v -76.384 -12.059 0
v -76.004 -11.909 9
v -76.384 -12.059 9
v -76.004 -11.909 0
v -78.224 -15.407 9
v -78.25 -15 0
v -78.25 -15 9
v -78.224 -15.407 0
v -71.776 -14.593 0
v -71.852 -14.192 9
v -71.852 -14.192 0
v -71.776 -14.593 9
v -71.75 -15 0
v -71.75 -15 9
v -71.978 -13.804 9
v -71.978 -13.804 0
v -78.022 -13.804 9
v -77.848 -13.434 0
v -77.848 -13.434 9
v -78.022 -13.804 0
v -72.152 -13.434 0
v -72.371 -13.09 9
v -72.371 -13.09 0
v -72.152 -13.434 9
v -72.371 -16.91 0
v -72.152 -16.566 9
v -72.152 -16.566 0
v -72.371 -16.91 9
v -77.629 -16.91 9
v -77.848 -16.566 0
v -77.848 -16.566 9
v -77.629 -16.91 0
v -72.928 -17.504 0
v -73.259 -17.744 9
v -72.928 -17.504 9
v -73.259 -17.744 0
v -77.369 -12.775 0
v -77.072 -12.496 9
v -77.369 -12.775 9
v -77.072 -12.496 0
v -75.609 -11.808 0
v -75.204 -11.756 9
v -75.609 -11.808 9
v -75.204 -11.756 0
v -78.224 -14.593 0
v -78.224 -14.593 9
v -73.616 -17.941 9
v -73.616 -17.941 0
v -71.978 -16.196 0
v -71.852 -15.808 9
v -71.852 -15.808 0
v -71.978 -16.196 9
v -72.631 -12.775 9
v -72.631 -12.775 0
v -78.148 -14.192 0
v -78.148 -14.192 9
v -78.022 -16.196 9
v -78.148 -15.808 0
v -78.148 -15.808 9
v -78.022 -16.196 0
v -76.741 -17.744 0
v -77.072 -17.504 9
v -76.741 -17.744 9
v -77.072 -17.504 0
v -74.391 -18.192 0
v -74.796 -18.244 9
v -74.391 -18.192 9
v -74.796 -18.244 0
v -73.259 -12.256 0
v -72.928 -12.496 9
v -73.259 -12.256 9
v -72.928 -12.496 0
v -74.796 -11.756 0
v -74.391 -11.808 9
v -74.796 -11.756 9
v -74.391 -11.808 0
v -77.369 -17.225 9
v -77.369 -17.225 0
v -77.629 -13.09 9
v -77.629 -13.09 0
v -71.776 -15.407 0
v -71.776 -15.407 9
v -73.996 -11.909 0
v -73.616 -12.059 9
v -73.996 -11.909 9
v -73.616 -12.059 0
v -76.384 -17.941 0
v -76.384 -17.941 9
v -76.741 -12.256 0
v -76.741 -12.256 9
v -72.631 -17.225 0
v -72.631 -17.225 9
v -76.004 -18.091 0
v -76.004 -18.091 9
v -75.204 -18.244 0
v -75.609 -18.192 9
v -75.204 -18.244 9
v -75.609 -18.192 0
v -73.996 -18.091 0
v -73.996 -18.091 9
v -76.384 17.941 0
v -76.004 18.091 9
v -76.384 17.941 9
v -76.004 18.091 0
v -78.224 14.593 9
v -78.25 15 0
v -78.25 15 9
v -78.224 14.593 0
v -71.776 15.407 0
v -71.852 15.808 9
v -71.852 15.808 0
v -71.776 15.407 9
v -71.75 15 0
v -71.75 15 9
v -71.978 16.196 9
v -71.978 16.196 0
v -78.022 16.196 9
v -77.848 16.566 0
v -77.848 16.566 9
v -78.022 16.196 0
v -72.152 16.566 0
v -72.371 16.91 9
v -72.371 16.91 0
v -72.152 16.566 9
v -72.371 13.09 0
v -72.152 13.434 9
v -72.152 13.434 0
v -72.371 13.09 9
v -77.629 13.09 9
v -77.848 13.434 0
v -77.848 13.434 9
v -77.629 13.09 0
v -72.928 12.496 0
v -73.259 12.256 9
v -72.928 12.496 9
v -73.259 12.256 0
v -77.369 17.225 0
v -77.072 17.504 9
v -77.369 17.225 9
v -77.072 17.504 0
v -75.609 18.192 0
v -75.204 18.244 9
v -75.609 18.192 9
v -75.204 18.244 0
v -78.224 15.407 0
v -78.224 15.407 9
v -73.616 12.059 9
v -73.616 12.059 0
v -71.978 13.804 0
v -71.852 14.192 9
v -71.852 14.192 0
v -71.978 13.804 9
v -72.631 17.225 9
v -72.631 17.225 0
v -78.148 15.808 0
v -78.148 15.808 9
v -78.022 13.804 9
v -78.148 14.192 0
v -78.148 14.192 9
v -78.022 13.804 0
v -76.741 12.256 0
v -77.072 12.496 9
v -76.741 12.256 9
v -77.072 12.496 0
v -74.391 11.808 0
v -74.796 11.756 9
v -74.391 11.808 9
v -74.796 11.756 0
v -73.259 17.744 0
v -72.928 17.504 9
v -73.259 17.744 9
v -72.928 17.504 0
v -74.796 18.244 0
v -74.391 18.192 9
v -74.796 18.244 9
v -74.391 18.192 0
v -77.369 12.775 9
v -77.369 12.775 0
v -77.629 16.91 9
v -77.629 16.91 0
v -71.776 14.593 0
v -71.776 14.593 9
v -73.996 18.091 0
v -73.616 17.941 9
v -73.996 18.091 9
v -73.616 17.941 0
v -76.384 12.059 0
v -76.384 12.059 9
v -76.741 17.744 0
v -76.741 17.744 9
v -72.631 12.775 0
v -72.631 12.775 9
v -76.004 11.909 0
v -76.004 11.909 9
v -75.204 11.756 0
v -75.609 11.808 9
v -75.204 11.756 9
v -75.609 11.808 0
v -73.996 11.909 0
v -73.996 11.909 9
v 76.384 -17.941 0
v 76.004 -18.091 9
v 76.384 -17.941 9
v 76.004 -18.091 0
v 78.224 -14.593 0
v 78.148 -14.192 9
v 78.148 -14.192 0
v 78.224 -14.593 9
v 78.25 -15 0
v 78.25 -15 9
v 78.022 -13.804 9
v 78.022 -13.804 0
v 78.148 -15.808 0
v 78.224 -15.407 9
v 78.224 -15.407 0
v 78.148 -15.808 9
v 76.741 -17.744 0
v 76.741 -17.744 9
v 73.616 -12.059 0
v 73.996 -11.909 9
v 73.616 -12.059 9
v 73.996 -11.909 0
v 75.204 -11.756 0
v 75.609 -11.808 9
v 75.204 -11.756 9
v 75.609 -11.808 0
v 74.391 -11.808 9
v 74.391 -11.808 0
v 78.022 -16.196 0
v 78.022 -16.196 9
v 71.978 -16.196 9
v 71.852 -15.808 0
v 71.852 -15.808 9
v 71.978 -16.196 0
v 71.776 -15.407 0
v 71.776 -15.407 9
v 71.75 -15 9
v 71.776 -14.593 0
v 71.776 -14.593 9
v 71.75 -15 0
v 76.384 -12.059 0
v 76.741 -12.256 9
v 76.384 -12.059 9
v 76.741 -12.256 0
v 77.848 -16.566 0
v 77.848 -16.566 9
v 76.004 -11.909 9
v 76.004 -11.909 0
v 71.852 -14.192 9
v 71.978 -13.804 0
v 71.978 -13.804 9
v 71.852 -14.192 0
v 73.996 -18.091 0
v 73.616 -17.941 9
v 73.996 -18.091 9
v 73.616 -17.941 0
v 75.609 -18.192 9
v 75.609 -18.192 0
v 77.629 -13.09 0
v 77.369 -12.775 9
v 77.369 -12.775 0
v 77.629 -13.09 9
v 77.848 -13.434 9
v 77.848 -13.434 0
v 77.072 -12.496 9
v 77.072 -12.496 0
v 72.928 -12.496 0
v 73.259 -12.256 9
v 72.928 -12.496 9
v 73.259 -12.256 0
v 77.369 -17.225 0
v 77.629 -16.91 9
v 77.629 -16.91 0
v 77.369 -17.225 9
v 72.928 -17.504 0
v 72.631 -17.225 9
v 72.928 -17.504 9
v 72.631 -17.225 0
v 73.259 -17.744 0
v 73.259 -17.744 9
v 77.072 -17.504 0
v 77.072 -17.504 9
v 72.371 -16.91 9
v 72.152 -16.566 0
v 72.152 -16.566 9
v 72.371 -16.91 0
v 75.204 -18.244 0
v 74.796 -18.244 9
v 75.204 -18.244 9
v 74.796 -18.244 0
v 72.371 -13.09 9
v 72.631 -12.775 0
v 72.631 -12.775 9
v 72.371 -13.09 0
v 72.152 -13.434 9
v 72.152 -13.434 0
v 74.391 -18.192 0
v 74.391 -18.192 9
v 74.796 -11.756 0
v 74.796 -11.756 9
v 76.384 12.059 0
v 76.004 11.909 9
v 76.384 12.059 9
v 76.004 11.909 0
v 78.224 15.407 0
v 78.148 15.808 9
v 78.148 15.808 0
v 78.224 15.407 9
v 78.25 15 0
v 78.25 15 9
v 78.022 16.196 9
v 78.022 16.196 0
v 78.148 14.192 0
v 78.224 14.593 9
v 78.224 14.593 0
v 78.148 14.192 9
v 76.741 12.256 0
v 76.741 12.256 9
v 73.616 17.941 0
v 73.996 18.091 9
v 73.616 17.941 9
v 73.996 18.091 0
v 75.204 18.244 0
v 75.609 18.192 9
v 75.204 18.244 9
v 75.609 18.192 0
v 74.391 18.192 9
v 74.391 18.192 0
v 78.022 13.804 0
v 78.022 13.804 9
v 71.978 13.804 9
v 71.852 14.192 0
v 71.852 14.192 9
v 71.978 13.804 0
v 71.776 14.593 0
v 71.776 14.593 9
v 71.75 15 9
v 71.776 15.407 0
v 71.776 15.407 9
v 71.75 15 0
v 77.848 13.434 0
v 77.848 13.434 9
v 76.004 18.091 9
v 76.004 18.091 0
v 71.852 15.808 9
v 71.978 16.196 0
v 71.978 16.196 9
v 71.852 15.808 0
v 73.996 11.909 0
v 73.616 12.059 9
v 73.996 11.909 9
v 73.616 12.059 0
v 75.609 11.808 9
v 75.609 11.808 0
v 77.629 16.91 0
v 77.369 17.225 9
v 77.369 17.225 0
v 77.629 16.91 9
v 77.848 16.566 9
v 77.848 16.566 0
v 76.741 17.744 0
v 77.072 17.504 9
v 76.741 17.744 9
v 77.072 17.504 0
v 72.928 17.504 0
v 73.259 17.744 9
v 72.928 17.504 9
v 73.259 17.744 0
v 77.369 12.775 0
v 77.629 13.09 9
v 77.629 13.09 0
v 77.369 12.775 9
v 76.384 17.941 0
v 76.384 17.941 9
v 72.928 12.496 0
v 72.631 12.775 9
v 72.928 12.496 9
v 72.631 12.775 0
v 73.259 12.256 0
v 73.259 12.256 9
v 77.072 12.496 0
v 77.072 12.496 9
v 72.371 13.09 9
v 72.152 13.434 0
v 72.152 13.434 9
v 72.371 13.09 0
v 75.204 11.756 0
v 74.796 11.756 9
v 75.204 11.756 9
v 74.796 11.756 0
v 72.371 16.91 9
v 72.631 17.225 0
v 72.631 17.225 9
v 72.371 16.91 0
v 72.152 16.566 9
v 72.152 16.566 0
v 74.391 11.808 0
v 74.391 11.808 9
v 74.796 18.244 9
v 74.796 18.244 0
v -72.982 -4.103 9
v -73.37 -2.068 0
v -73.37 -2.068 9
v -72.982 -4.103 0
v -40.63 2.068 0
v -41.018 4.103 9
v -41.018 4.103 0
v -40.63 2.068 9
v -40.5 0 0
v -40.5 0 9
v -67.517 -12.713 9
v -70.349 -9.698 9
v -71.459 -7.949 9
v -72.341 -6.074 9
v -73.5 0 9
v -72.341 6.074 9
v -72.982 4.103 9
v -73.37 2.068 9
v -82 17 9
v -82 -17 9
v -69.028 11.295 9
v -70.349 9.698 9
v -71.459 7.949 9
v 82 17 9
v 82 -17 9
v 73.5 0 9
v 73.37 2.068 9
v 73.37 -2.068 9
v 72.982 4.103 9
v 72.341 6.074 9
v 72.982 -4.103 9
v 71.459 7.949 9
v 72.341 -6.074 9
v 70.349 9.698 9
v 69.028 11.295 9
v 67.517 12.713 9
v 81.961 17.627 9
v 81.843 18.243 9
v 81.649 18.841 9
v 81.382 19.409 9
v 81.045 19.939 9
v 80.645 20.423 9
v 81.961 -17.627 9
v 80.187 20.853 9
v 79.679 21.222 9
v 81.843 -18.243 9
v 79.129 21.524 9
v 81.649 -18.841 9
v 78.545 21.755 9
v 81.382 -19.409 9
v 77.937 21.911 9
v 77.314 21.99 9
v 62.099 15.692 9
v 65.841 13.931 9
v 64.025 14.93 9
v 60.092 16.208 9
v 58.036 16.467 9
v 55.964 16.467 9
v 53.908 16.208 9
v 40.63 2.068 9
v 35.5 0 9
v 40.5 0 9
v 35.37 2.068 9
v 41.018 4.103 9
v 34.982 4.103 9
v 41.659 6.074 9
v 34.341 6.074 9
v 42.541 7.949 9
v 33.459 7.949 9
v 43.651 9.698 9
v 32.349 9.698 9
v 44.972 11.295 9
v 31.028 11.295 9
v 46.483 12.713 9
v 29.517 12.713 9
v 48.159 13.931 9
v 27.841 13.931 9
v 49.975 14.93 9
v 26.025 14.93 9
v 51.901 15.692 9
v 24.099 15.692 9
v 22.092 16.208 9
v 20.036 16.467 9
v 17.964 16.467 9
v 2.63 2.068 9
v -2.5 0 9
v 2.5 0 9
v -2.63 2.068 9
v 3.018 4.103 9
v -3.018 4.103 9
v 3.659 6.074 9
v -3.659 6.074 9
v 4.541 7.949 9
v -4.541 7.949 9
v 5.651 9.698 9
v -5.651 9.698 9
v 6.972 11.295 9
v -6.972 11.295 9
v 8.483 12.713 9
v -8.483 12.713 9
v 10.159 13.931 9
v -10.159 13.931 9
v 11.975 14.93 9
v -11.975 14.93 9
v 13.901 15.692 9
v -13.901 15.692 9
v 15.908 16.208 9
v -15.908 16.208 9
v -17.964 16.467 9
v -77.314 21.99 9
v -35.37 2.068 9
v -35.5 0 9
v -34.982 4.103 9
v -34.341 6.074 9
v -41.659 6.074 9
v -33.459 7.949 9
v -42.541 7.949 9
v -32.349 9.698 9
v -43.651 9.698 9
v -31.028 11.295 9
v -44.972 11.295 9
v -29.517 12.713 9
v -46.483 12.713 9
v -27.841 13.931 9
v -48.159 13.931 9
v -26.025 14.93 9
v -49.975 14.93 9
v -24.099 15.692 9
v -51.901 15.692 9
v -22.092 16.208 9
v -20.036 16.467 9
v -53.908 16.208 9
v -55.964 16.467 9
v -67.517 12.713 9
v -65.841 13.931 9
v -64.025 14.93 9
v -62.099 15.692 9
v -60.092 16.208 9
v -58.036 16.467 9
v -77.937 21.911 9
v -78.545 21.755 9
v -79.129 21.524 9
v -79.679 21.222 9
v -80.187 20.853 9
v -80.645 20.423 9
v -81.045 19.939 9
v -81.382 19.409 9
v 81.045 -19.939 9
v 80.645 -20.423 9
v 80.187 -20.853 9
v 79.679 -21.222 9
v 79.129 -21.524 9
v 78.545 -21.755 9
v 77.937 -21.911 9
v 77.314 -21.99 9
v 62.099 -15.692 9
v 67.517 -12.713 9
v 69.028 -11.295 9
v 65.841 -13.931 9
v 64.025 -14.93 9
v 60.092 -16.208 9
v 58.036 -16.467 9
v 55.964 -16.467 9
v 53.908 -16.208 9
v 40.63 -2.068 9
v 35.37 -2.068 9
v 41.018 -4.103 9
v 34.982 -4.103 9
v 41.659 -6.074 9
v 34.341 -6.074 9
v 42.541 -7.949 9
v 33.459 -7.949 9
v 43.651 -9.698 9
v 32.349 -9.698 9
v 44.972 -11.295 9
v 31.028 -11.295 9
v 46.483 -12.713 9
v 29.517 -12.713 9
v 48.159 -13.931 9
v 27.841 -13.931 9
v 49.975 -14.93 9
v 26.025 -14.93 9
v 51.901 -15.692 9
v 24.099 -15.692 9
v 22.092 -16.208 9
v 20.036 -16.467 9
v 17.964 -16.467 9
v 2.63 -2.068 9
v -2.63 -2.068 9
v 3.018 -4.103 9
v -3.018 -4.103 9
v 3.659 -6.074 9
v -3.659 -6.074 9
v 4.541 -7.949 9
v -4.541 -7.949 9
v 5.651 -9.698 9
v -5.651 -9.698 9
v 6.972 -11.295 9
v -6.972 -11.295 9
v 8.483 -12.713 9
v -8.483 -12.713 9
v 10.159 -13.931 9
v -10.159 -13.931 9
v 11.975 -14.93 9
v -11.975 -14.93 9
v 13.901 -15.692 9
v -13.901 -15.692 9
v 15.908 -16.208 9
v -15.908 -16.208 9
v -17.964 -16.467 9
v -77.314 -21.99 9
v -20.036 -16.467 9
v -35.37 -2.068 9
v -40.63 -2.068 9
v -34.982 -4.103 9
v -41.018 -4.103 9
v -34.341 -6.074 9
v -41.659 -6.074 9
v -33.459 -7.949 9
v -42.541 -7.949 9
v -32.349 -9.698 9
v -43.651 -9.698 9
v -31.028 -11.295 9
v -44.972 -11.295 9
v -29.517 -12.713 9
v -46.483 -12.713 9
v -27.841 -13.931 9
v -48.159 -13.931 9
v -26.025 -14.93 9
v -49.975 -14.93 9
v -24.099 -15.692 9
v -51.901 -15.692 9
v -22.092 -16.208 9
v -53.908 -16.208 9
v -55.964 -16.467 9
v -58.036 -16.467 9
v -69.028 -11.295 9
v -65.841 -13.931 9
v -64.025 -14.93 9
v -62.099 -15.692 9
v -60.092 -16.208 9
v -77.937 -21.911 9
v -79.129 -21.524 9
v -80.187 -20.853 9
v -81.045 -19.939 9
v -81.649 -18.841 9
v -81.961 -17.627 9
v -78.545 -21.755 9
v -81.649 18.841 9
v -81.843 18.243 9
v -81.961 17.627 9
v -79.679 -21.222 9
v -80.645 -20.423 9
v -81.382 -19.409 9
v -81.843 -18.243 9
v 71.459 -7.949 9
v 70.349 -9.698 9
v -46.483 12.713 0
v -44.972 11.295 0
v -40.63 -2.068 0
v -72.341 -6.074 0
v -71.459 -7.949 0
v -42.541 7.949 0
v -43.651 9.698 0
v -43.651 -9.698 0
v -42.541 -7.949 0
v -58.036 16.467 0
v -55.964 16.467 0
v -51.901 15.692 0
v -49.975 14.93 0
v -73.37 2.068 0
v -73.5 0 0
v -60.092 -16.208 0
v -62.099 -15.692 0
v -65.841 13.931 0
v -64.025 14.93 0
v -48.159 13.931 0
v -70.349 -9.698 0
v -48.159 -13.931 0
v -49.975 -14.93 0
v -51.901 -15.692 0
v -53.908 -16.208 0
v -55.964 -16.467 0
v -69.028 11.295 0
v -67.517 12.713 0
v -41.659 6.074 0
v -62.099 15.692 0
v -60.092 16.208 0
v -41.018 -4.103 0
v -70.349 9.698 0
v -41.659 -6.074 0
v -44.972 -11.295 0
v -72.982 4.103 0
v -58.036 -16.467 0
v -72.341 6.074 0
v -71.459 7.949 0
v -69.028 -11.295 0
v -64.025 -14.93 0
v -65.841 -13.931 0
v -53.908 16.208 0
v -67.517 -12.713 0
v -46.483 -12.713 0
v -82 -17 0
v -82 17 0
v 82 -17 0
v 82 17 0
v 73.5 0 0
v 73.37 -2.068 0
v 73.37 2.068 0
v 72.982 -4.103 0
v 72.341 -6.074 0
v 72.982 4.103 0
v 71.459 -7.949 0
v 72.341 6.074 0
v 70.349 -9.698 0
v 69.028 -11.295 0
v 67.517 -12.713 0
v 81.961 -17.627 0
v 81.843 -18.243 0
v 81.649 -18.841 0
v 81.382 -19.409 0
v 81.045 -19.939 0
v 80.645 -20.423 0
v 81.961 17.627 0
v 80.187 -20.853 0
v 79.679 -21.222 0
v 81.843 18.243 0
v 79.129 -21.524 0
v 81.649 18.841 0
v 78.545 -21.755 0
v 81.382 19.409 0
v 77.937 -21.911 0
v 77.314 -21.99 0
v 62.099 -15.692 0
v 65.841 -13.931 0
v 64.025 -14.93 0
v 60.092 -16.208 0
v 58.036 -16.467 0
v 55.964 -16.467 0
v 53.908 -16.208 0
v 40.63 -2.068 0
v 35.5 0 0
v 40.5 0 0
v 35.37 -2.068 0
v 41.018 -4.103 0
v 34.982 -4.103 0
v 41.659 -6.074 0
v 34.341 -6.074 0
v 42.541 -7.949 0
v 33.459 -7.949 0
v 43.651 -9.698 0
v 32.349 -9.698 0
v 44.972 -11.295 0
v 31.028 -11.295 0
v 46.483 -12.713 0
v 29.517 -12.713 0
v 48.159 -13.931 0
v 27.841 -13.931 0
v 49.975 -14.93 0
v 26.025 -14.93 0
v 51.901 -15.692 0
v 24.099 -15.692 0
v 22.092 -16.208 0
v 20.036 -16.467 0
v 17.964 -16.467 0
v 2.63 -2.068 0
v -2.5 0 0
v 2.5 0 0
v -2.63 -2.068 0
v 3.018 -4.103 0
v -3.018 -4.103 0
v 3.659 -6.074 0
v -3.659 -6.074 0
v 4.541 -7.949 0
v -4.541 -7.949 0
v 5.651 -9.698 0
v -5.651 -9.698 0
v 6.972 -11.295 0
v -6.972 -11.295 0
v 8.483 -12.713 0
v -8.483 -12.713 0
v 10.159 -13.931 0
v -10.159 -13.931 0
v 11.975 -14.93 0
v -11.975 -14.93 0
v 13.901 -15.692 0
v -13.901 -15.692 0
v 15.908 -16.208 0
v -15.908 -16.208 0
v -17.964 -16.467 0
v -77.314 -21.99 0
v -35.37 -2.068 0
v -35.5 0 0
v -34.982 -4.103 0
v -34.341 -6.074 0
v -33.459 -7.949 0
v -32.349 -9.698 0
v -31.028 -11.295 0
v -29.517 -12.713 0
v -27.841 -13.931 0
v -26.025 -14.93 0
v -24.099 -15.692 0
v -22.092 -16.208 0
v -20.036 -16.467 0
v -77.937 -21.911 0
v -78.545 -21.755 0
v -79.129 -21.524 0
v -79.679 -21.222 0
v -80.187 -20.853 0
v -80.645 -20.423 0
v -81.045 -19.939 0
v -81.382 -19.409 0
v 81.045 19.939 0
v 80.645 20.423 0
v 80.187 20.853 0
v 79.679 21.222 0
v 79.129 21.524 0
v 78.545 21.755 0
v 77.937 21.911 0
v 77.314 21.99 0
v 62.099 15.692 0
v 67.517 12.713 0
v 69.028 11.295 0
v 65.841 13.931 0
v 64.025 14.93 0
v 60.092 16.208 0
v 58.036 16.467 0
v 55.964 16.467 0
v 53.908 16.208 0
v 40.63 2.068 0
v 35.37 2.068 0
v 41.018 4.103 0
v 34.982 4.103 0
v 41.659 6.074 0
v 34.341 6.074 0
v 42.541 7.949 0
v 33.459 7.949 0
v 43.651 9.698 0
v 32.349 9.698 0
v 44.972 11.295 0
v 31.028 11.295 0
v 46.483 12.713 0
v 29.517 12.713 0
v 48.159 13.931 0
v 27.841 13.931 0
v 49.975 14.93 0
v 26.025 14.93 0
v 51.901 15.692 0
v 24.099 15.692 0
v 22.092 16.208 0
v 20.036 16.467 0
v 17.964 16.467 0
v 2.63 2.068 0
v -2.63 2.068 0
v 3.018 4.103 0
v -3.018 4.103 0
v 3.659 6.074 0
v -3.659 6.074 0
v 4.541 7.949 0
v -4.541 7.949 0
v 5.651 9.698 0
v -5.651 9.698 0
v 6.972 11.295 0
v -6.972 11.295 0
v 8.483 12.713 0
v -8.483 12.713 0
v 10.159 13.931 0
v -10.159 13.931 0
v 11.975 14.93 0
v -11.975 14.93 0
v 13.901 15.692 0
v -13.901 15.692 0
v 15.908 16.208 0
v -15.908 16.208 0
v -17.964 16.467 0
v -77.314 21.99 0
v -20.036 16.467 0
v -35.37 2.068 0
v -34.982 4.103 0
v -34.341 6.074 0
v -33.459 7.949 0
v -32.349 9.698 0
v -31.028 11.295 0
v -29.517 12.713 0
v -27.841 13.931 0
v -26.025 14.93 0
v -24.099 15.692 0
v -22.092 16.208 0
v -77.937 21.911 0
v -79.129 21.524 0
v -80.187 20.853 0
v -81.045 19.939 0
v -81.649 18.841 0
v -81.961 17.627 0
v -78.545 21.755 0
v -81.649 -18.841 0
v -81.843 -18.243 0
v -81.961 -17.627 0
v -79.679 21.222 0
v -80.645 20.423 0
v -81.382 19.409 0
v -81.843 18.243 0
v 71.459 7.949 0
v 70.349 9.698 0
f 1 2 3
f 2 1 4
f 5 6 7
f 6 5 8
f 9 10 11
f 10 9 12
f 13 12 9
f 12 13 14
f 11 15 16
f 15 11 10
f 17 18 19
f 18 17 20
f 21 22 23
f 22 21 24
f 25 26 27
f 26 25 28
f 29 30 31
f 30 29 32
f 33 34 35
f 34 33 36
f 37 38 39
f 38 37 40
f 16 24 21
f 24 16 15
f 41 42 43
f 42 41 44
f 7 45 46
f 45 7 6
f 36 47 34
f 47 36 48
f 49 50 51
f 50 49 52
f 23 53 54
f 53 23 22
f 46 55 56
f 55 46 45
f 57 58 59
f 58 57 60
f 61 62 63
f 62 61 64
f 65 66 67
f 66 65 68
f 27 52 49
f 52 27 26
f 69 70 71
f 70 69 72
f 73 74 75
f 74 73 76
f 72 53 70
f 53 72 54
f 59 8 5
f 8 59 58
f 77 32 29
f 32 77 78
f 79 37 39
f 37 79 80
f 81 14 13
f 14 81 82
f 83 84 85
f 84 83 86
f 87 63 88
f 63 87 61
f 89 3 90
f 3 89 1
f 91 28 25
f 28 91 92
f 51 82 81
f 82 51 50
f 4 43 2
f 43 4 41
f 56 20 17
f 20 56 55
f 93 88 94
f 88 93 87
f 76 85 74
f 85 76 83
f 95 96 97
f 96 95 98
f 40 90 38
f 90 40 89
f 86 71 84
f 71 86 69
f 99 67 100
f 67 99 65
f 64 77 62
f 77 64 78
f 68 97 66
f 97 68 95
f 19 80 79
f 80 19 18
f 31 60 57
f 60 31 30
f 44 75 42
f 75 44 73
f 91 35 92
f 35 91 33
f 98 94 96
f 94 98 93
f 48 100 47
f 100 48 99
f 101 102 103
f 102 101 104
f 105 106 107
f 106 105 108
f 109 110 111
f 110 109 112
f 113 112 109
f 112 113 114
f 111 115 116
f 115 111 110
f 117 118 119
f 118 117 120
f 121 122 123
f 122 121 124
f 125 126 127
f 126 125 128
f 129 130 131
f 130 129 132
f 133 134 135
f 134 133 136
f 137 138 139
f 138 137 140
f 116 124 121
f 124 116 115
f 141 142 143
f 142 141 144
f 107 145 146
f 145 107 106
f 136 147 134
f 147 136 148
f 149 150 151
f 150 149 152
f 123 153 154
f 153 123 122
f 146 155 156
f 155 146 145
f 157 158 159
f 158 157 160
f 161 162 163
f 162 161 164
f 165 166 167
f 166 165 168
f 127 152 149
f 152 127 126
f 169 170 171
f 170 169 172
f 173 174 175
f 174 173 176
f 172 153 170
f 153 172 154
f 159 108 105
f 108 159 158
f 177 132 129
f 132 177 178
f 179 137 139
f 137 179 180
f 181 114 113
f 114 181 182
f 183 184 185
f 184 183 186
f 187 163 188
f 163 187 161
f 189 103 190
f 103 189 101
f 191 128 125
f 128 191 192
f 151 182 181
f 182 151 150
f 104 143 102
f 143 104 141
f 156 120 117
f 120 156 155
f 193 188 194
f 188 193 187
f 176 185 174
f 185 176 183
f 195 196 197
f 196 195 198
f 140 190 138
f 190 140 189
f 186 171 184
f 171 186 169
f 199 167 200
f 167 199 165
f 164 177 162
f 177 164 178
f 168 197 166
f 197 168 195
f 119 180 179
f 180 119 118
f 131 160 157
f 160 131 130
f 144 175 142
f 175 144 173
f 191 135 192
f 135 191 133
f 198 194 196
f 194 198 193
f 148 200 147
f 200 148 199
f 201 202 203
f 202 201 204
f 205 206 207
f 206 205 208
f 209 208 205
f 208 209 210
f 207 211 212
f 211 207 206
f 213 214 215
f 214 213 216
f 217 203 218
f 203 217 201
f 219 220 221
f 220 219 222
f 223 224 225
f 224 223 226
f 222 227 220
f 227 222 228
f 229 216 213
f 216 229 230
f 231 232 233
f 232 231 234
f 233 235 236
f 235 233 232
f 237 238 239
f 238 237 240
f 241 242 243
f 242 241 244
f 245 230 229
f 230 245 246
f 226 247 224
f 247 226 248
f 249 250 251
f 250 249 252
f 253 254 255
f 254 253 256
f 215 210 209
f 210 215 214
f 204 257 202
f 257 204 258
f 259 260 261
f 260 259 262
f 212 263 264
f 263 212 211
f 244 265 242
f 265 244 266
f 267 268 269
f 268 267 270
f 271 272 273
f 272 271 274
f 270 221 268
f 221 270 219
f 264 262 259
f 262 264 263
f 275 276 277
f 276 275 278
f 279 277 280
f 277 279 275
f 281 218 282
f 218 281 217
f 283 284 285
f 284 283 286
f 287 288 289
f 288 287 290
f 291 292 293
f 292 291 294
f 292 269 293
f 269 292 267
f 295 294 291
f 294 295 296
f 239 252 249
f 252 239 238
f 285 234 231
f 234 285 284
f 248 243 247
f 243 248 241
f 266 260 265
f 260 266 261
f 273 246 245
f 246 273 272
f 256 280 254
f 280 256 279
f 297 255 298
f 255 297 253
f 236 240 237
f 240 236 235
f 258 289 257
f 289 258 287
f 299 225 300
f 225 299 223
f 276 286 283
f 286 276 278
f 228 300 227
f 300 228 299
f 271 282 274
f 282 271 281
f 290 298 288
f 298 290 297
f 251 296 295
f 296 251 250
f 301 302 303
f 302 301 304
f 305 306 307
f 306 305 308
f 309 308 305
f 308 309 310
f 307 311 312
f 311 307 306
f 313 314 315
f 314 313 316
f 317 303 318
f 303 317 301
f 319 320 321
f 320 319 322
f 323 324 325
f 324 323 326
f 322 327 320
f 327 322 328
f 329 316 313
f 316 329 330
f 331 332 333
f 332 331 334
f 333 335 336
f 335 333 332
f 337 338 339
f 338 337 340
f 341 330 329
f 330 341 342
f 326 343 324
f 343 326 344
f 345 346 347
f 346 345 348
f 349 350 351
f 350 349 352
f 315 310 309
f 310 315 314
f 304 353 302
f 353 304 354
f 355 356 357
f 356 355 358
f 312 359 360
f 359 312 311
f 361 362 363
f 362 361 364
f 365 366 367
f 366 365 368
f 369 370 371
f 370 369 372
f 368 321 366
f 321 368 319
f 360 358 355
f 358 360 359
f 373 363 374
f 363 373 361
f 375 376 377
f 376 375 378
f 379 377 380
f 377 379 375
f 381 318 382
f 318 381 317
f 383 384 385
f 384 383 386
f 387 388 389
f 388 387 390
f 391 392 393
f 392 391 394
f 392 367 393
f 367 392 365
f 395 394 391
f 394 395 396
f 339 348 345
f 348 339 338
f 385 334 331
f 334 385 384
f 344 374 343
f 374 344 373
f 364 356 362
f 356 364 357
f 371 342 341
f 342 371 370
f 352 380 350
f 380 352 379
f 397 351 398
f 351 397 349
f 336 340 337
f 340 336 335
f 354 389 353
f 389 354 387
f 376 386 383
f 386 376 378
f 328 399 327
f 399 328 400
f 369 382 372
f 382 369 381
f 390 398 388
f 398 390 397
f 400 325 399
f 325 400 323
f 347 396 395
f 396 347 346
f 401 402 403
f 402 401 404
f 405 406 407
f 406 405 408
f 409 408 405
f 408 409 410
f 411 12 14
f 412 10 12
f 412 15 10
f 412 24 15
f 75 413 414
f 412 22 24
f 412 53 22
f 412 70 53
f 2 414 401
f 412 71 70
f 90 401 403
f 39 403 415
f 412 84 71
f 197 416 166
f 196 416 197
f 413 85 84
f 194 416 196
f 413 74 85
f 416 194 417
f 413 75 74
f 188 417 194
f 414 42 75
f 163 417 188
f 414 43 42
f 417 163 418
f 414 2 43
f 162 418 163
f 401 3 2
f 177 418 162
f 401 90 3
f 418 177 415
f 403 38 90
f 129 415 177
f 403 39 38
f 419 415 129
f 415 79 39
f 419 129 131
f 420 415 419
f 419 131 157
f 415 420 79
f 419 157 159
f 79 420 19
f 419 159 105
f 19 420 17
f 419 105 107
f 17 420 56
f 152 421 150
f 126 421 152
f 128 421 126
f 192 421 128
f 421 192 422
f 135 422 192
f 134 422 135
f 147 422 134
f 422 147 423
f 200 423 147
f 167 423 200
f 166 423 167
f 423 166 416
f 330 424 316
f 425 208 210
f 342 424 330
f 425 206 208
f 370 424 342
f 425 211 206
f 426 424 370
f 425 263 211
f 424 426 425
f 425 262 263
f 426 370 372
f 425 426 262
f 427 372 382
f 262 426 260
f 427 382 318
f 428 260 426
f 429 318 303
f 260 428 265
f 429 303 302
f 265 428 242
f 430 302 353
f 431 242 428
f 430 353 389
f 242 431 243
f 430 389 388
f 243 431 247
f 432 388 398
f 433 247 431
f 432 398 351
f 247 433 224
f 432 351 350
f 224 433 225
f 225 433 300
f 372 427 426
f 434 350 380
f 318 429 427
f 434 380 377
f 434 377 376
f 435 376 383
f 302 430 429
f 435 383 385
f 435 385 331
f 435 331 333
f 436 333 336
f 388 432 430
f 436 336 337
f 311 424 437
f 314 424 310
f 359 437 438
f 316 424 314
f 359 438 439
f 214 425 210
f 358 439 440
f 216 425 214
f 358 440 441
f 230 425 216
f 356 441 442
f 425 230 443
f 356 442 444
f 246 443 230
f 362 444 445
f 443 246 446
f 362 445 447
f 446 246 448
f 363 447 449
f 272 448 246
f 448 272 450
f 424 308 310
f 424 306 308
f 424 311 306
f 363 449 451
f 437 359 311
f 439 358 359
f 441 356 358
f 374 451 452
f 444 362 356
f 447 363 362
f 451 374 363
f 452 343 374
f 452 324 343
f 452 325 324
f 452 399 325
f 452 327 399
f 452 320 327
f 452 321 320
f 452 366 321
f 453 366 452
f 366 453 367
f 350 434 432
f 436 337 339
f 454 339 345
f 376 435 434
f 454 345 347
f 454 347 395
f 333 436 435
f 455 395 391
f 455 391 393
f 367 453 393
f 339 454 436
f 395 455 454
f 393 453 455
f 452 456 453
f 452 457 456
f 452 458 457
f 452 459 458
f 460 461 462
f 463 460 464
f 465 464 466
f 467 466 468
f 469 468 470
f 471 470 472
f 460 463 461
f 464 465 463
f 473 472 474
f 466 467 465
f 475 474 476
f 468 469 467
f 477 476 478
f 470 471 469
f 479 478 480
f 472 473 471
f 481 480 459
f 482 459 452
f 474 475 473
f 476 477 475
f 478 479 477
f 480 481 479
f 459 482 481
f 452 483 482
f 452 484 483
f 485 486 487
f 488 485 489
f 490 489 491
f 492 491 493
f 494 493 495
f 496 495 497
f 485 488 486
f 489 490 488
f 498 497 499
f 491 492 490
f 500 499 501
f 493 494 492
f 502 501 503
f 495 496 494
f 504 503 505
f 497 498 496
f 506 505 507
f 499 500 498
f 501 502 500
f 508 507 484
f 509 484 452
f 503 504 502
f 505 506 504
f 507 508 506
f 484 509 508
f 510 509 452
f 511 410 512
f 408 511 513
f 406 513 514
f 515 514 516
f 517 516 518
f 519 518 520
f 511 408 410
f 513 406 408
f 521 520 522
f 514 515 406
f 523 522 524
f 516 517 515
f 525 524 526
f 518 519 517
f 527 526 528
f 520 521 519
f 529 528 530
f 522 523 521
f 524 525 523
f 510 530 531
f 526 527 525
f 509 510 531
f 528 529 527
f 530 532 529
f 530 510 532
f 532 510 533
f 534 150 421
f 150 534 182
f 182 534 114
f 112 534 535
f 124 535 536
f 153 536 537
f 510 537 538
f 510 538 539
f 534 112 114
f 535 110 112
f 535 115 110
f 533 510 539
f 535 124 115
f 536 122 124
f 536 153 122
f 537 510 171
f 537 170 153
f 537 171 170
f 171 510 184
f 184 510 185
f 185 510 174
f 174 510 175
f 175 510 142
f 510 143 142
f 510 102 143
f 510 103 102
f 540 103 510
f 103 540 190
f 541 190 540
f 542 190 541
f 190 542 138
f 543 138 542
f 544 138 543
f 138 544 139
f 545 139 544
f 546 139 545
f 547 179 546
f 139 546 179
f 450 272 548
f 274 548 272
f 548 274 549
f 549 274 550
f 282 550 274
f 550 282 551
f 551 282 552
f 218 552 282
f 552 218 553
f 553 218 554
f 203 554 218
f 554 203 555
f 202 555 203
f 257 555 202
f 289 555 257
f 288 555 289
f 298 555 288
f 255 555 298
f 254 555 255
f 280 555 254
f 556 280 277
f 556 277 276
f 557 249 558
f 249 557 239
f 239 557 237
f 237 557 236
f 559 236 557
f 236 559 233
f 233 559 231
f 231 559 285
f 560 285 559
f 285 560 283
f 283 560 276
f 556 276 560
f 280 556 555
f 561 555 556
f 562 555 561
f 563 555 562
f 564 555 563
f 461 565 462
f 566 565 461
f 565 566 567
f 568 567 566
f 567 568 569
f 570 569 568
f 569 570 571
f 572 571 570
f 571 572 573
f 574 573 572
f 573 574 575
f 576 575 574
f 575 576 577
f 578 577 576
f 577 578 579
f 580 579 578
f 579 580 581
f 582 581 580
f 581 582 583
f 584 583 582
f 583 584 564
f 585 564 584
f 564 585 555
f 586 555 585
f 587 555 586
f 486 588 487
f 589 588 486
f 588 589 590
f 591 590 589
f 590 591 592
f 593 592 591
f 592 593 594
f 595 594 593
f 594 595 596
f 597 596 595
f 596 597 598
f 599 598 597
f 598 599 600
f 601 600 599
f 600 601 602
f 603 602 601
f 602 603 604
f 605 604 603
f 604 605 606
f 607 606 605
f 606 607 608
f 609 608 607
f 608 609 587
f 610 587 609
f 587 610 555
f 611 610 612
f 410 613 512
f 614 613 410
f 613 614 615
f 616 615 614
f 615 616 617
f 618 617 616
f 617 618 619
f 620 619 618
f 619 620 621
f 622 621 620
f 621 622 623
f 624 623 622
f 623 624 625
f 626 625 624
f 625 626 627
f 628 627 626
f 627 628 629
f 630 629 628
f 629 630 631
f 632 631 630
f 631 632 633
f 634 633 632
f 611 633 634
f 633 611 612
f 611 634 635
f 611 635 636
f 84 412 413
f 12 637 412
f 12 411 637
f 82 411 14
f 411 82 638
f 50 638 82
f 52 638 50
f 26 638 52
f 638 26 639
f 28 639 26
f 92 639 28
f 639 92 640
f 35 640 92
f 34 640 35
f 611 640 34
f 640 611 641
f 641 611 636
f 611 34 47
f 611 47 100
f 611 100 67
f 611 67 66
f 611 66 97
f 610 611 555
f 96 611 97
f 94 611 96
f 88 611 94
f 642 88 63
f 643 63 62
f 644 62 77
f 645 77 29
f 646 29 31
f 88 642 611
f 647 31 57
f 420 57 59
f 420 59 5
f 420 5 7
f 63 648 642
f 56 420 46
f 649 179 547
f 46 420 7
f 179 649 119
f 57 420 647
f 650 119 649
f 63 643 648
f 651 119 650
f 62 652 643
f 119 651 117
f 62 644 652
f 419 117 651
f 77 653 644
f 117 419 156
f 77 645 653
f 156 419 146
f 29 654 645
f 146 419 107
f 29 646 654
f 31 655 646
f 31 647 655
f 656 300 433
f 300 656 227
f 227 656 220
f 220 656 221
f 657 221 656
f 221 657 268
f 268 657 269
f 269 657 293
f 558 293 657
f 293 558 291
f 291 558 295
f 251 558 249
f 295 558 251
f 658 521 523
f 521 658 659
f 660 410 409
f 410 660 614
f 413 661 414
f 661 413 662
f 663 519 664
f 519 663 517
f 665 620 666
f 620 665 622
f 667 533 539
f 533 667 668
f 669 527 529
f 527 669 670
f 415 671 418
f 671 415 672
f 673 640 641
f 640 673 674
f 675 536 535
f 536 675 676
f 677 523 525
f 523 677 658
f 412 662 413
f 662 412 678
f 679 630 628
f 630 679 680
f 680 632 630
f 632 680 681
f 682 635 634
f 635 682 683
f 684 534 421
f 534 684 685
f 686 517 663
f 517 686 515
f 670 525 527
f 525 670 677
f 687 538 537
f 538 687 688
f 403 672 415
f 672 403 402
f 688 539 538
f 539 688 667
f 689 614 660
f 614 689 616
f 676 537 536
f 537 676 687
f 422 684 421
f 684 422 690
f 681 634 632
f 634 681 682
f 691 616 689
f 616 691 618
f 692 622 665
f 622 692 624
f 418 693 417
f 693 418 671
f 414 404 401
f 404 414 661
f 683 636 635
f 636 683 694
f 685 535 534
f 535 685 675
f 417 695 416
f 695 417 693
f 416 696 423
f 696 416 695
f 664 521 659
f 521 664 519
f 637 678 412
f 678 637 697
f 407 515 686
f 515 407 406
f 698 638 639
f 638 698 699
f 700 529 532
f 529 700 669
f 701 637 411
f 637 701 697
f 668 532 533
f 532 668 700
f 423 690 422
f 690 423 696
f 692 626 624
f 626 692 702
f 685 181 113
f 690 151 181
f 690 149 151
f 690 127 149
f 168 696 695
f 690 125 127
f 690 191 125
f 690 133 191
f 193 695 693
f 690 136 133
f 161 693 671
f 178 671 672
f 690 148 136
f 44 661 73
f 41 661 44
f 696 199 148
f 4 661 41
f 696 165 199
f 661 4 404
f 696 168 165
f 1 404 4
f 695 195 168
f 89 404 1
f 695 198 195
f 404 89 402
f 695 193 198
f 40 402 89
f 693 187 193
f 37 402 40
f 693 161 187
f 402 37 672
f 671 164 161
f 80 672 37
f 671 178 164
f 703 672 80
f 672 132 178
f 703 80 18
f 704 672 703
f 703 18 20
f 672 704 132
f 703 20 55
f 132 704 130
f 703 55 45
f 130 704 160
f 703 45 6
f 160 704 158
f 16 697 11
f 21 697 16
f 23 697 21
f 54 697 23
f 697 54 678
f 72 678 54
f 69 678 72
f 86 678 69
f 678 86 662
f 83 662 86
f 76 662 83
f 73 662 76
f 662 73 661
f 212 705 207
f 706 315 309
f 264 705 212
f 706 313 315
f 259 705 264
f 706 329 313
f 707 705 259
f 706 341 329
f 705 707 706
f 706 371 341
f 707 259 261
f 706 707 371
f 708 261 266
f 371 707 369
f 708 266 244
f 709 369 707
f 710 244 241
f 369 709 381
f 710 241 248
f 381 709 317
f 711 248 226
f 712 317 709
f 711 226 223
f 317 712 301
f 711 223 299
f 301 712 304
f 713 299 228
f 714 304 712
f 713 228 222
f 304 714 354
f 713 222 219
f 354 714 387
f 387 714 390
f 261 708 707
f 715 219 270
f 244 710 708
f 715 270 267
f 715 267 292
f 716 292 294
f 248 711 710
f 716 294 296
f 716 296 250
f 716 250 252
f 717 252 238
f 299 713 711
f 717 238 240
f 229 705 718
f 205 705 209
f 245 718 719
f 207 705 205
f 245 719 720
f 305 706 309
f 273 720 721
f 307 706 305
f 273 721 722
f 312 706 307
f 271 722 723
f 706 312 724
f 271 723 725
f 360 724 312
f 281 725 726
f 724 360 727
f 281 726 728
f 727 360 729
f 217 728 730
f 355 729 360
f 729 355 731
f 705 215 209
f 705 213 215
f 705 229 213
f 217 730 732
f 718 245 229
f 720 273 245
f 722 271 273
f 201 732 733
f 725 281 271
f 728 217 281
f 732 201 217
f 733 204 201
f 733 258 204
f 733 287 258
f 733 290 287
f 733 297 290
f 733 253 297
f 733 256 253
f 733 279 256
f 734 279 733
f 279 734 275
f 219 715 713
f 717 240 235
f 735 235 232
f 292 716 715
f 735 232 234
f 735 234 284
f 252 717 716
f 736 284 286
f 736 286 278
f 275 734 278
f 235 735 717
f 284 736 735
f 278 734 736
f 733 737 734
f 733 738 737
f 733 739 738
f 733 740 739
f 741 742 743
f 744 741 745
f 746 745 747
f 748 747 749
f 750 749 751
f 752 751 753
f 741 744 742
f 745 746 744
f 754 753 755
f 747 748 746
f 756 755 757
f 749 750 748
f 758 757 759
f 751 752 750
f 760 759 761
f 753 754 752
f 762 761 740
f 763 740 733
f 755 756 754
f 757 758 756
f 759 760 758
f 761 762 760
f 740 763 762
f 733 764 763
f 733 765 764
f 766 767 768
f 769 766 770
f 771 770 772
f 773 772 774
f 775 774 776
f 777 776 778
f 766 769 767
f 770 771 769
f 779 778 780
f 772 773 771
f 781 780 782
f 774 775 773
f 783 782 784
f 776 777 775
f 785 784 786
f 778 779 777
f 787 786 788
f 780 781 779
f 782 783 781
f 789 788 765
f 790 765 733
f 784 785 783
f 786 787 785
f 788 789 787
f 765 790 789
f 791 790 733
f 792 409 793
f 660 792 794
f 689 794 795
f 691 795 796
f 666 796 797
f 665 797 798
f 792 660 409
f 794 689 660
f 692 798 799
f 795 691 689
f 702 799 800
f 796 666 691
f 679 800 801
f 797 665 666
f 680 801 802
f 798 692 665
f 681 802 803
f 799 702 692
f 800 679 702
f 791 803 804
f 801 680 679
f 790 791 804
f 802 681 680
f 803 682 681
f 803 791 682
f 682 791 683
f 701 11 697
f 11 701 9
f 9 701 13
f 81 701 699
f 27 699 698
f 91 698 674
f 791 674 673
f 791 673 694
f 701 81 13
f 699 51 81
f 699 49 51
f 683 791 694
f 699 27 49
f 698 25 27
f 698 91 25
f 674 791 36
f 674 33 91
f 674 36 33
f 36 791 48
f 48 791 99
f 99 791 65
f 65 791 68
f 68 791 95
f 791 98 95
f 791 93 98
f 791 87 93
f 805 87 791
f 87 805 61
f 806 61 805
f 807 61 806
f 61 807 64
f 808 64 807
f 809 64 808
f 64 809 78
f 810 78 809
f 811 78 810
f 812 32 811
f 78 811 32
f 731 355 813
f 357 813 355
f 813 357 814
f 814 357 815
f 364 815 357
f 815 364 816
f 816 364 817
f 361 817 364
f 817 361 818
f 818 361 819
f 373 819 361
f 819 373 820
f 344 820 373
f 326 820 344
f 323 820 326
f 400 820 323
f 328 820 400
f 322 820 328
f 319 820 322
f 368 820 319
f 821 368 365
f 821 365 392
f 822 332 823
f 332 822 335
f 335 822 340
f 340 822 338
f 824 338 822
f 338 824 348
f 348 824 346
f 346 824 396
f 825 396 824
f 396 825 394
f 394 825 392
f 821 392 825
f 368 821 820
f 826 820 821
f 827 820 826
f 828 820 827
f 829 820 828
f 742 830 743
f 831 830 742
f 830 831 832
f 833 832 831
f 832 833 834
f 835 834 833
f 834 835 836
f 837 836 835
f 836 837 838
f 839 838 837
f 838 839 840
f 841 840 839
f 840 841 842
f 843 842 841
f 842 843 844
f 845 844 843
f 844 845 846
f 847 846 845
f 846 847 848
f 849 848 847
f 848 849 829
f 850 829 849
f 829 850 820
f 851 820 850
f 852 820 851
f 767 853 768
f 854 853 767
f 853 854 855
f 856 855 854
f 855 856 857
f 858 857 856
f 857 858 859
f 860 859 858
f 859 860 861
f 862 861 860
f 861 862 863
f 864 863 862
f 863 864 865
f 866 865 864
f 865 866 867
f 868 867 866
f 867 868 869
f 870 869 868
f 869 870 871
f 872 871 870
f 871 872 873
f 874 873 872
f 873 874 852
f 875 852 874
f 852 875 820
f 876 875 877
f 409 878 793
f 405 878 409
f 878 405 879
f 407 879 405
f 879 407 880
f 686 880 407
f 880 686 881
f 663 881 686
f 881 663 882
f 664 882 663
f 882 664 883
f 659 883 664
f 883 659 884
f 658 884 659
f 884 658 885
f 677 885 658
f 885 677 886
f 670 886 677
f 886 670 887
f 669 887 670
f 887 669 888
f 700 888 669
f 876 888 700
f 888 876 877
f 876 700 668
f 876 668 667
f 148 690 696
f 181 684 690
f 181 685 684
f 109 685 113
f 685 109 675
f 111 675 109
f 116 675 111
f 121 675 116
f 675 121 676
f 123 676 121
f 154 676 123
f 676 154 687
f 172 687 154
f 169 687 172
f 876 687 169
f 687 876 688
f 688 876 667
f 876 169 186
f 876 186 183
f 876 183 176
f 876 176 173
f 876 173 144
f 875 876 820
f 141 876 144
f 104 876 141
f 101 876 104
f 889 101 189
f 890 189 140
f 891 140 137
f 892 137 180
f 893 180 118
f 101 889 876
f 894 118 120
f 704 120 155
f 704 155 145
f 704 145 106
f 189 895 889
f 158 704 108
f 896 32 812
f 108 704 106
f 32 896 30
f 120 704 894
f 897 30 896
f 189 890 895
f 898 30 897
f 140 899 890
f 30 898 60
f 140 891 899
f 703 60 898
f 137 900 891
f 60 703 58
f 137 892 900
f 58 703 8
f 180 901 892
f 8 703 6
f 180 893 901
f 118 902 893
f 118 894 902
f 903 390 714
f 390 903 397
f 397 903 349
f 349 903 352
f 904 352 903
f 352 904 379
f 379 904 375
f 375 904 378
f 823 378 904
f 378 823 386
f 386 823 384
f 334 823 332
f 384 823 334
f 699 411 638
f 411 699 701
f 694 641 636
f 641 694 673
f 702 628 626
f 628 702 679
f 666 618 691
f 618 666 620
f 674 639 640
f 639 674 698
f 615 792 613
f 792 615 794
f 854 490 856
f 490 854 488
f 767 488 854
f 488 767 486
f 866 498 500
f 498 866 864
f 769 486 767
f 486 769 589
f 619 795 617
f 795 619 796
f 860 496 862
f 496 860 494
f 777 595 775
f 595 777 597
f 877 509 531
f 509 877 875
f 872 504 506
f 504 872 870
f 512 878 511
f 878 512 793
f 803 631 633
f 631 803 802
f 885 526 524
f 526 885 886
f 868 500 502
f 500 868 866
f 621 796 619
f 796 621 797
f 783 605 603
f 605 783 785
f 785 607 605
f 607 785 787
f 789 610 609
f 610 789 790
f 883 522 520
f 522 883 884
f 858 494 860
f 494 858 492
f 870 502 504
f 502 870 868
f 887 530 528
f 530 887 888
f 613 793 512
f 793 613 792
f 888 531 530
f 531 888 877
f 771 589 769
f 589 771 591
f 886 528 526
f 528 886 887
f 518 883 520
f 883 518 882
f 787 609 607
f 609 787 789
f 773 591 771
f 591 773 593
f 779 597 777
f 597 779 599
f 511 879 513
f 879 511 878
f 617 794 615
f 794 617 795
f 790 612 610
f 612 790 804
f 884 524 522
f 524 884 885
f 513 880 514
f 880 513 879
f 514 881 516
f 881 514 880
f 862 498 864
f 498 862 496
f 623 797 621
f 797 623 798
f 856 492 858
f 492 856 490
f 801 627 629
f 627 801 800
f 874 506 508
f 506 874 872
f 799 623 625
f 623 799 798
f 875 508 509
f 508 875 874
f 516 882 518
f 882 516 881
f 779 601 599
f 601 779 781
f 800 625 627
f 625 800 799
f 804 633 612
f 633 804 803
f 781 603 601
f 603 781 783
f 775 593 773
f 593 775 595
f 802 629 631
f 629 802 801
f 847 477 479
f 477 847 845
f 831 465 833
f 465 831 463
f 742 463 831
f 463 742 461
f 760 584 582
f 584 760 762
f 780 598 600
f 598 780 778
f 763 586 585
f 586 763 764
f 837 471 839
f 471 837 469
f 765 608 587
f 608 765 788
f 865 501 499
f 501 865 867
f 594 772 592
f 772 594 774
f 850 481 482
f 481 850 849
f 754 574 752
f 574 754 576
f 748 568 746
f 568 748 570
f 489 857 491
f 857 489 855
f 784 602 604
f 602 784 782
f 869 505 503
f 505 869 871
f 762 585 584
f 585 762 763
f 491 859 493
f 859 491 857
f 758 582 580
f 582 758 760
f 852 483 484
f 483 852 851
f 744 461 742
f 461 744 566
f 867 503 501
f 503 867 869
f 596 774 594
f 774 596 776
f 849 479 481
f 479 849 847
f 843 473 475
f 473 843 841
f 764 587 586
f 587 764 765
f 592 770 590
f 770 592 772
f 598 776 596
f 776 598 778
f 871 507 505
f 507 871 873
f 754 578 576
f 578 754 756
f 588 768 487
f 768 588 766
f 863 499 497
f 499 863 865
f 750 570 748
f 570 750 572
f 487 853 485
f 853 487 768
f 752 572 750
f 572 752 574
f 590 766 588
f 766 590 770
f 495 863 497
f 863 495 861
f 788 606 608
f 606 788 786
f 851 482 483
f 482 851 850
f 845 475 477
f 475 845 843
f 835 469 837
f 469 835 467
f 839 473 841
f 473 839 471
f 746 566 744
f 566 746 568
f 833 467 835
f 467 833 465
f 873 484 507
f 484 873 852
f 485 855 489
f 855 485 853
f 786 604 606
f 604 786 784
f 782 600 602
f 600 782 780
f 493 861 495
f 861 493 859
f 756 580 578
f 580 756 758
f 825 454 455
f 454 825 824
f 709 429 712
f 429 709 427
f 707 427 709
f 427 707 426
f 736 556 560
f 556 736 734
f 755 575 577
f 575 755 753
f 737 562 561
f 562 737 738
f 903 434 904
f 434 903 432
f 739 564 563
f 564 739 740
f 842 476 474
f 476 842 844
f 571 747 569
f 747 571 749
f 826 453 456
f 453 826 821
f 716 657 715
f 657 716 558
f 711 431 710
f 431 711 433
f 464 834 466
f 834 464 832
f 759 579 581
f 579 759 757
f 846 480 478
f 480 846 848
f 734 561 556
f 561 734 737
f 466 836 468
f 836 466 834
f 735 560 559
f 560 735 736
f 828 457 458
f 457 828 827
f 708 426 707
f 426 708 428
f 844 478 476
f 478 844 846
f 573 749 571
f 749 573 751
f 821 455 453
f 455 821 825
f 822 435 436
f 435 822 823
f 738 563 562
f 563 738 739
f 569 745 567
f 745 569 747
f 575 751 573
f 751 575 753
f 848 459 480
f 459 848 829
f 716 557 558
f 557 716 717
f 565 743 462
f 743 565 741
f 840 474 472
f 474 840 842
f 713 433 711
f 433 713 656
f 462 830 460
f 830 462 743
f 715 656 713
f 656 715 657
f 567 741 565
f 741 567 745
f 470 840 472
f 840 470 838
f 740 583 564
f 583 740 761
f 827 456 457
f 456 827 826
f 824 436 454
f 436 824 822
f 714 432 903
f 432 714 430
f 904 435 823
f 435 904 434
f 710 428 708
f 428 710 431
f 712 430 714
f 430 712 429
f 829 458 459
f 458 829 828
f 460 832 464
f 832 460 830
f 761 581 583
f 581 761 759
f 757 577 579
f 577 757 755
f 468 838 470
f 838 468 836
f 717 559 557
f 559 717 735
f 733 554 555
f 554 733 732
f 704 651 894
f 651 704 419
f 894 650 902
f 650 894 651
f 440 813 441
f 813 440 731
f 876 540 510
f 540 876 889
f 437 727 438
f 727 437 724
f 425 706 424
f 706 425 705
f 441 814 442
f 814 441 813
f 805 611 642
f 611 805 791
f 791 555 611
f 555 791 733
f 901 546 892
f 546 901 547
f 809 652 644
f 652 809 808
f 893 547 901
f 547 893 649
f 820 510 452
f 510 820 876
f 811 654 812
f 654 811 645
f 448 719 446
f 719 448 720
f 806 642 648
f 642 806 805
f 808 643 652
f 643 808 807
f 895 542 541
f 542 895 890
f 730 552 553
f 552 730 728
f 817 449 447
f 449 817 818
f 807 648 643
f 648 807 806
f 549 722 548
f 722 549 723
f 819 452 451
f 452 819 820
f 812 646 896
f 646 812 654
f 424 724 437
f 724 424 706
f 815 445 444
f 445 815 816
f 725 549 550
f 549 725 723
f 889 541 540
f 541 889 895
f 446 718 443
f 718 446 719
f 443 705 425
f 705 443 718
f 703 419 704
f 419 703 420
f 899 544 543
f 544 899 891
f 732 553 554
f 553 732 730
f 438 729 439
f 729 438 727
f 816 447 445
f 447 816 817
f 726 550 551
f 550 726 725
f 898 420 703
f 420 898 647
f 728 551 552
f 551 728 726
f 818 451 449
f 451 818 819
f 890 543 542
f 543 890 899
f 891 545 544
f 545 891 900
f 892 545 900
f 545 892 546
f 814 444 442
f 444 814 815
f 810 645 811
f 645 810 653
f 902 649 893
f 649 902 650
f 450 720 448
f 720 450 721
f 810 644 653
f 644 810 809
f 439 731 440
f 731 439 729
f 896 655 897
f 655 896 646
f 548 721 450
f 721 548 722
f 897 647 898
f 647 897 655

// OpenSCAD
$fn = 50;

difference() {
	union() {
		hull() {
			translate(v = [-77.0, 17.0, 0]) {
				cylinder(h = 9, r = 5);
			}
			translate(v = [77.0, 17.0, 0]) {
				cylinder(h = 9, r = 5);
			}
			translate(v = [-77.0, -17.0, 0]) {
				cylinder(h = 9, r = 5);
			}
			translate(v = [77.0, -17.0, 0]) {
				cylinder(h = 9, r = 5);
			}
		}
	}
	union() {
		translate(v = [-75.0, -15.0, -100.0]) {
			cylinder(h = 200, r = 3.25);
		}
		translate(v = [-75.0, 15.0, -100.0]) {
			cylinder(h = 200, r = 3.25);
		}
		translate(v = [75.0, -15.0, -100.0]) {
			cylinder(h = 200, r = 3.25);
		}
		translate(v = [75.0, 15.0, -100.0]) {
			cylinder(h = 200, r = 3.25);
		}
		translate(v = [-75.0, -15.0, -100.0]) {
			cylinder(h = 200, r = 1.8);
		}
		translate(v = [-75.0, 15.0, -100.0]) {
			cylinder(h = 200, r = 1.8);
		}
		translate(v = [75.0, -15.0, -100.0]) {
			cylinder(h = 200, r = 1.8);
		}
		translate(v = [75.0, 15.0, -100.0]) {
			cylinder(h = 200, r = 1.8);
		}
		translate(v = [-57.0, 0, 0.0]) {
			cylinder(h = 9, r = 16.5);
		}
		translate(v = [-19.0, 0, 0.0]) {
			cylinder(h = 9, r = 16.5);
		}
		translate(v = [19.0, 0, 0.0]) {
			cylinder(h = 9, r = 16.5);
		}
		translate(v = [57.0, 0, 0.0]) {
			cylinder(h = 9, r = 16.5);
		}
	}
}
